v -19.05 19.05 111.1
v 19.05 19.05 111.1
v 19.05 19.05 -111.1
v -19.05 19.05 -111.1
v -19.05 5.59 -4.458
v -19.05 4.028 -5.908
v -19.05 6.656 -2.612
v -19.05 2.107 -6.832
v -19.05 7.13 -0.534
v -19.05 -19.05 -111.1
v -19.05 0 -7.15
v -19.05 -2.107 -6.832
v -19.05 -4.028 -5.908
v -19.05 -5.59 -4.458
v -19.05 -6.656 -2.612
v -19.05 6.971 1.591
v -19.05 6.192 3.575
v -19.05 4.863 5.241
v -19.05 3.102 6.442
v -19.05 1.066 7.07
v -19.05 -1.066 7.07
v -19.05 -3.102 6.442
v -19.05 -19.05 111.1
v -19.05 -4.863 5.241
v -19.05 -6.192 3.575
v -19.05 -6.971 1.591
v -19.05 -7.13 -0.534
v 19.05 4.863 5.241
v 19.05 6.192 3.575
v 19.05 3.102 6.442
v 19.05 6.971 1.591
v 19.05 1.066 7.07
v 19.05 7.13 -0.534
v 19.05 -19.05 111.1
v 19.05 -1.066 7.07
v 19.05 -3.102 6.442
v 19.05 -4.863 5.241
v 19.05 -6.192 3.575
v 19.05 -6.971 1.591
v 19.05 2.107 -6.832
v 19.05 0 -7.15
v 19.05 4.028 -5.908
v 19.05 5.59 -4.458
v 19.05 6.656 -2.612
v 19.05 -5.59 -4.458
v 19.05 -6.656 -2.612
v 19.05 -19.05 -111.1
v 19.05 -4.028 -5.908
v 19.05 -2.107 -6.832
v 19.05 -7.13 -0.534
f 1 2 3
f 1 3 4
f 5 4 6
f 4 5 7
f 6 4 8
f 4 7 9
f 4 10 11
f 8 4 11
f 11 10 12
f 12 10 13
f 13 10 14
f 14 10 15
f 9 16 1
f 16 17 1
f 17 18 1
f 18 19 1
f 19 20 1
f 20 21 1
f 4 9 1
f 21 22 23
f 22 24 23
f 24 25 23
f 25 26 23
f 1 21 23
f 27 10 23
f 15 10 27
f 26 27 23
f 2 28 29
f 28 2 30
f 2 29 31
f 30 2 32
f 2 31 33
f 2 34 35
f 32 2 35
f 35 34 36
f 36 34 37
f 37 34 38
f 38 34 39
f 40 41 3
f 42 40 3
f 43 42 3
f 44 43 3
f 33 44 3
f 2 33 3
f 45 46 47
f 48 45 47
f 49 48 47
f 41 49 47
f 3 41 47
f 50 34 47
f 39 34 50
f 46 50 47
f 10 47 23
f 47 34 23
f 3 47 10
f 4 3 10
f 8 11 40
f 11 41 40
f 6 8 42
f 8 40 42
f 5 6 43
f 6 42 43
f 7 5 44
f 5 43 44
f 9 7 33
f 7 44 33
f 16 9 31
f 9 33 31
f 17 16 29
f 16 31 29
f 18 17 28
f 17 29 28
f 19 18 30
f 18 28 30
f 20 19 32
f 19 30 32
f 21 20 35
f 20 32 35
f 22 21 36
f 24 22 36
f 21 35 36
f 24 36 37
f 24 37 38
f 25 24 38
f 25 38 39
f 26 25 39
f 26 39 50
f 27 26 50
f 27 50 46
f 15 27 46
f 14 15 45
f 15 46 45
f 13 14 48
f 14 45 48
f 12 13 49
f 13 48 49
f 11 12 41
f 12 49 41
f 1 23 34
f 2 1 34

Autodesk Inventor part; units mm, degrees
ref_plane "YZ Plane" through (0, 0, 0) normal (1, 0, 0) x (0, 1, 0)
ref_plane "XZ Plane" through (0, 0, 0) normal (0, 1, 0) x (-1, 0, 0)
ref_plane "XY Plane" through (0, 0, 0) normal (0, 0, 1) x (1, 0, 0)
sketch "Sketch1" plane through (0, 0, 0) normal (0, 1, 0) x (-1, 0, 0)
  line L0 (19.05, 111.1) -> (-19.05, 111.1)
  line L1 (-19.05, 111.1) -> (-19.05, -111.1)
  line L2 (-19.05, -111.1) -> (19.05, -111.1)
  line L3 (19.05, -111.1) -> (19.05, 111.1)
  line L4 (19.05, 111.1) -> (-19.05, -111.1) construction
  line L5 (-19.05, 111.1) -> (19.05, -111.1) construction
  point P0 (0, 0)
  dimension "d0" = 222.2
  dimension "d1" = 38.1
extrude "Extrusion1" add sketch "Sketch1" along normal mid plane 38.1
sketch "Sketch2" plane through (19.05, -19.05, -111.1) normal (1, 0, 0) x (0, 0, -1)
  circle A0 centre (-111.1, 19.05) radius 7.15
  point P0 (-111.1, 11.9)
  dimension "d4" = 14.3
extrude "Extrusion2" cut sketch "Sketch2" against normal through all
properties part number "CNC-1.1v-X-7-( axis mover nut inside)"
